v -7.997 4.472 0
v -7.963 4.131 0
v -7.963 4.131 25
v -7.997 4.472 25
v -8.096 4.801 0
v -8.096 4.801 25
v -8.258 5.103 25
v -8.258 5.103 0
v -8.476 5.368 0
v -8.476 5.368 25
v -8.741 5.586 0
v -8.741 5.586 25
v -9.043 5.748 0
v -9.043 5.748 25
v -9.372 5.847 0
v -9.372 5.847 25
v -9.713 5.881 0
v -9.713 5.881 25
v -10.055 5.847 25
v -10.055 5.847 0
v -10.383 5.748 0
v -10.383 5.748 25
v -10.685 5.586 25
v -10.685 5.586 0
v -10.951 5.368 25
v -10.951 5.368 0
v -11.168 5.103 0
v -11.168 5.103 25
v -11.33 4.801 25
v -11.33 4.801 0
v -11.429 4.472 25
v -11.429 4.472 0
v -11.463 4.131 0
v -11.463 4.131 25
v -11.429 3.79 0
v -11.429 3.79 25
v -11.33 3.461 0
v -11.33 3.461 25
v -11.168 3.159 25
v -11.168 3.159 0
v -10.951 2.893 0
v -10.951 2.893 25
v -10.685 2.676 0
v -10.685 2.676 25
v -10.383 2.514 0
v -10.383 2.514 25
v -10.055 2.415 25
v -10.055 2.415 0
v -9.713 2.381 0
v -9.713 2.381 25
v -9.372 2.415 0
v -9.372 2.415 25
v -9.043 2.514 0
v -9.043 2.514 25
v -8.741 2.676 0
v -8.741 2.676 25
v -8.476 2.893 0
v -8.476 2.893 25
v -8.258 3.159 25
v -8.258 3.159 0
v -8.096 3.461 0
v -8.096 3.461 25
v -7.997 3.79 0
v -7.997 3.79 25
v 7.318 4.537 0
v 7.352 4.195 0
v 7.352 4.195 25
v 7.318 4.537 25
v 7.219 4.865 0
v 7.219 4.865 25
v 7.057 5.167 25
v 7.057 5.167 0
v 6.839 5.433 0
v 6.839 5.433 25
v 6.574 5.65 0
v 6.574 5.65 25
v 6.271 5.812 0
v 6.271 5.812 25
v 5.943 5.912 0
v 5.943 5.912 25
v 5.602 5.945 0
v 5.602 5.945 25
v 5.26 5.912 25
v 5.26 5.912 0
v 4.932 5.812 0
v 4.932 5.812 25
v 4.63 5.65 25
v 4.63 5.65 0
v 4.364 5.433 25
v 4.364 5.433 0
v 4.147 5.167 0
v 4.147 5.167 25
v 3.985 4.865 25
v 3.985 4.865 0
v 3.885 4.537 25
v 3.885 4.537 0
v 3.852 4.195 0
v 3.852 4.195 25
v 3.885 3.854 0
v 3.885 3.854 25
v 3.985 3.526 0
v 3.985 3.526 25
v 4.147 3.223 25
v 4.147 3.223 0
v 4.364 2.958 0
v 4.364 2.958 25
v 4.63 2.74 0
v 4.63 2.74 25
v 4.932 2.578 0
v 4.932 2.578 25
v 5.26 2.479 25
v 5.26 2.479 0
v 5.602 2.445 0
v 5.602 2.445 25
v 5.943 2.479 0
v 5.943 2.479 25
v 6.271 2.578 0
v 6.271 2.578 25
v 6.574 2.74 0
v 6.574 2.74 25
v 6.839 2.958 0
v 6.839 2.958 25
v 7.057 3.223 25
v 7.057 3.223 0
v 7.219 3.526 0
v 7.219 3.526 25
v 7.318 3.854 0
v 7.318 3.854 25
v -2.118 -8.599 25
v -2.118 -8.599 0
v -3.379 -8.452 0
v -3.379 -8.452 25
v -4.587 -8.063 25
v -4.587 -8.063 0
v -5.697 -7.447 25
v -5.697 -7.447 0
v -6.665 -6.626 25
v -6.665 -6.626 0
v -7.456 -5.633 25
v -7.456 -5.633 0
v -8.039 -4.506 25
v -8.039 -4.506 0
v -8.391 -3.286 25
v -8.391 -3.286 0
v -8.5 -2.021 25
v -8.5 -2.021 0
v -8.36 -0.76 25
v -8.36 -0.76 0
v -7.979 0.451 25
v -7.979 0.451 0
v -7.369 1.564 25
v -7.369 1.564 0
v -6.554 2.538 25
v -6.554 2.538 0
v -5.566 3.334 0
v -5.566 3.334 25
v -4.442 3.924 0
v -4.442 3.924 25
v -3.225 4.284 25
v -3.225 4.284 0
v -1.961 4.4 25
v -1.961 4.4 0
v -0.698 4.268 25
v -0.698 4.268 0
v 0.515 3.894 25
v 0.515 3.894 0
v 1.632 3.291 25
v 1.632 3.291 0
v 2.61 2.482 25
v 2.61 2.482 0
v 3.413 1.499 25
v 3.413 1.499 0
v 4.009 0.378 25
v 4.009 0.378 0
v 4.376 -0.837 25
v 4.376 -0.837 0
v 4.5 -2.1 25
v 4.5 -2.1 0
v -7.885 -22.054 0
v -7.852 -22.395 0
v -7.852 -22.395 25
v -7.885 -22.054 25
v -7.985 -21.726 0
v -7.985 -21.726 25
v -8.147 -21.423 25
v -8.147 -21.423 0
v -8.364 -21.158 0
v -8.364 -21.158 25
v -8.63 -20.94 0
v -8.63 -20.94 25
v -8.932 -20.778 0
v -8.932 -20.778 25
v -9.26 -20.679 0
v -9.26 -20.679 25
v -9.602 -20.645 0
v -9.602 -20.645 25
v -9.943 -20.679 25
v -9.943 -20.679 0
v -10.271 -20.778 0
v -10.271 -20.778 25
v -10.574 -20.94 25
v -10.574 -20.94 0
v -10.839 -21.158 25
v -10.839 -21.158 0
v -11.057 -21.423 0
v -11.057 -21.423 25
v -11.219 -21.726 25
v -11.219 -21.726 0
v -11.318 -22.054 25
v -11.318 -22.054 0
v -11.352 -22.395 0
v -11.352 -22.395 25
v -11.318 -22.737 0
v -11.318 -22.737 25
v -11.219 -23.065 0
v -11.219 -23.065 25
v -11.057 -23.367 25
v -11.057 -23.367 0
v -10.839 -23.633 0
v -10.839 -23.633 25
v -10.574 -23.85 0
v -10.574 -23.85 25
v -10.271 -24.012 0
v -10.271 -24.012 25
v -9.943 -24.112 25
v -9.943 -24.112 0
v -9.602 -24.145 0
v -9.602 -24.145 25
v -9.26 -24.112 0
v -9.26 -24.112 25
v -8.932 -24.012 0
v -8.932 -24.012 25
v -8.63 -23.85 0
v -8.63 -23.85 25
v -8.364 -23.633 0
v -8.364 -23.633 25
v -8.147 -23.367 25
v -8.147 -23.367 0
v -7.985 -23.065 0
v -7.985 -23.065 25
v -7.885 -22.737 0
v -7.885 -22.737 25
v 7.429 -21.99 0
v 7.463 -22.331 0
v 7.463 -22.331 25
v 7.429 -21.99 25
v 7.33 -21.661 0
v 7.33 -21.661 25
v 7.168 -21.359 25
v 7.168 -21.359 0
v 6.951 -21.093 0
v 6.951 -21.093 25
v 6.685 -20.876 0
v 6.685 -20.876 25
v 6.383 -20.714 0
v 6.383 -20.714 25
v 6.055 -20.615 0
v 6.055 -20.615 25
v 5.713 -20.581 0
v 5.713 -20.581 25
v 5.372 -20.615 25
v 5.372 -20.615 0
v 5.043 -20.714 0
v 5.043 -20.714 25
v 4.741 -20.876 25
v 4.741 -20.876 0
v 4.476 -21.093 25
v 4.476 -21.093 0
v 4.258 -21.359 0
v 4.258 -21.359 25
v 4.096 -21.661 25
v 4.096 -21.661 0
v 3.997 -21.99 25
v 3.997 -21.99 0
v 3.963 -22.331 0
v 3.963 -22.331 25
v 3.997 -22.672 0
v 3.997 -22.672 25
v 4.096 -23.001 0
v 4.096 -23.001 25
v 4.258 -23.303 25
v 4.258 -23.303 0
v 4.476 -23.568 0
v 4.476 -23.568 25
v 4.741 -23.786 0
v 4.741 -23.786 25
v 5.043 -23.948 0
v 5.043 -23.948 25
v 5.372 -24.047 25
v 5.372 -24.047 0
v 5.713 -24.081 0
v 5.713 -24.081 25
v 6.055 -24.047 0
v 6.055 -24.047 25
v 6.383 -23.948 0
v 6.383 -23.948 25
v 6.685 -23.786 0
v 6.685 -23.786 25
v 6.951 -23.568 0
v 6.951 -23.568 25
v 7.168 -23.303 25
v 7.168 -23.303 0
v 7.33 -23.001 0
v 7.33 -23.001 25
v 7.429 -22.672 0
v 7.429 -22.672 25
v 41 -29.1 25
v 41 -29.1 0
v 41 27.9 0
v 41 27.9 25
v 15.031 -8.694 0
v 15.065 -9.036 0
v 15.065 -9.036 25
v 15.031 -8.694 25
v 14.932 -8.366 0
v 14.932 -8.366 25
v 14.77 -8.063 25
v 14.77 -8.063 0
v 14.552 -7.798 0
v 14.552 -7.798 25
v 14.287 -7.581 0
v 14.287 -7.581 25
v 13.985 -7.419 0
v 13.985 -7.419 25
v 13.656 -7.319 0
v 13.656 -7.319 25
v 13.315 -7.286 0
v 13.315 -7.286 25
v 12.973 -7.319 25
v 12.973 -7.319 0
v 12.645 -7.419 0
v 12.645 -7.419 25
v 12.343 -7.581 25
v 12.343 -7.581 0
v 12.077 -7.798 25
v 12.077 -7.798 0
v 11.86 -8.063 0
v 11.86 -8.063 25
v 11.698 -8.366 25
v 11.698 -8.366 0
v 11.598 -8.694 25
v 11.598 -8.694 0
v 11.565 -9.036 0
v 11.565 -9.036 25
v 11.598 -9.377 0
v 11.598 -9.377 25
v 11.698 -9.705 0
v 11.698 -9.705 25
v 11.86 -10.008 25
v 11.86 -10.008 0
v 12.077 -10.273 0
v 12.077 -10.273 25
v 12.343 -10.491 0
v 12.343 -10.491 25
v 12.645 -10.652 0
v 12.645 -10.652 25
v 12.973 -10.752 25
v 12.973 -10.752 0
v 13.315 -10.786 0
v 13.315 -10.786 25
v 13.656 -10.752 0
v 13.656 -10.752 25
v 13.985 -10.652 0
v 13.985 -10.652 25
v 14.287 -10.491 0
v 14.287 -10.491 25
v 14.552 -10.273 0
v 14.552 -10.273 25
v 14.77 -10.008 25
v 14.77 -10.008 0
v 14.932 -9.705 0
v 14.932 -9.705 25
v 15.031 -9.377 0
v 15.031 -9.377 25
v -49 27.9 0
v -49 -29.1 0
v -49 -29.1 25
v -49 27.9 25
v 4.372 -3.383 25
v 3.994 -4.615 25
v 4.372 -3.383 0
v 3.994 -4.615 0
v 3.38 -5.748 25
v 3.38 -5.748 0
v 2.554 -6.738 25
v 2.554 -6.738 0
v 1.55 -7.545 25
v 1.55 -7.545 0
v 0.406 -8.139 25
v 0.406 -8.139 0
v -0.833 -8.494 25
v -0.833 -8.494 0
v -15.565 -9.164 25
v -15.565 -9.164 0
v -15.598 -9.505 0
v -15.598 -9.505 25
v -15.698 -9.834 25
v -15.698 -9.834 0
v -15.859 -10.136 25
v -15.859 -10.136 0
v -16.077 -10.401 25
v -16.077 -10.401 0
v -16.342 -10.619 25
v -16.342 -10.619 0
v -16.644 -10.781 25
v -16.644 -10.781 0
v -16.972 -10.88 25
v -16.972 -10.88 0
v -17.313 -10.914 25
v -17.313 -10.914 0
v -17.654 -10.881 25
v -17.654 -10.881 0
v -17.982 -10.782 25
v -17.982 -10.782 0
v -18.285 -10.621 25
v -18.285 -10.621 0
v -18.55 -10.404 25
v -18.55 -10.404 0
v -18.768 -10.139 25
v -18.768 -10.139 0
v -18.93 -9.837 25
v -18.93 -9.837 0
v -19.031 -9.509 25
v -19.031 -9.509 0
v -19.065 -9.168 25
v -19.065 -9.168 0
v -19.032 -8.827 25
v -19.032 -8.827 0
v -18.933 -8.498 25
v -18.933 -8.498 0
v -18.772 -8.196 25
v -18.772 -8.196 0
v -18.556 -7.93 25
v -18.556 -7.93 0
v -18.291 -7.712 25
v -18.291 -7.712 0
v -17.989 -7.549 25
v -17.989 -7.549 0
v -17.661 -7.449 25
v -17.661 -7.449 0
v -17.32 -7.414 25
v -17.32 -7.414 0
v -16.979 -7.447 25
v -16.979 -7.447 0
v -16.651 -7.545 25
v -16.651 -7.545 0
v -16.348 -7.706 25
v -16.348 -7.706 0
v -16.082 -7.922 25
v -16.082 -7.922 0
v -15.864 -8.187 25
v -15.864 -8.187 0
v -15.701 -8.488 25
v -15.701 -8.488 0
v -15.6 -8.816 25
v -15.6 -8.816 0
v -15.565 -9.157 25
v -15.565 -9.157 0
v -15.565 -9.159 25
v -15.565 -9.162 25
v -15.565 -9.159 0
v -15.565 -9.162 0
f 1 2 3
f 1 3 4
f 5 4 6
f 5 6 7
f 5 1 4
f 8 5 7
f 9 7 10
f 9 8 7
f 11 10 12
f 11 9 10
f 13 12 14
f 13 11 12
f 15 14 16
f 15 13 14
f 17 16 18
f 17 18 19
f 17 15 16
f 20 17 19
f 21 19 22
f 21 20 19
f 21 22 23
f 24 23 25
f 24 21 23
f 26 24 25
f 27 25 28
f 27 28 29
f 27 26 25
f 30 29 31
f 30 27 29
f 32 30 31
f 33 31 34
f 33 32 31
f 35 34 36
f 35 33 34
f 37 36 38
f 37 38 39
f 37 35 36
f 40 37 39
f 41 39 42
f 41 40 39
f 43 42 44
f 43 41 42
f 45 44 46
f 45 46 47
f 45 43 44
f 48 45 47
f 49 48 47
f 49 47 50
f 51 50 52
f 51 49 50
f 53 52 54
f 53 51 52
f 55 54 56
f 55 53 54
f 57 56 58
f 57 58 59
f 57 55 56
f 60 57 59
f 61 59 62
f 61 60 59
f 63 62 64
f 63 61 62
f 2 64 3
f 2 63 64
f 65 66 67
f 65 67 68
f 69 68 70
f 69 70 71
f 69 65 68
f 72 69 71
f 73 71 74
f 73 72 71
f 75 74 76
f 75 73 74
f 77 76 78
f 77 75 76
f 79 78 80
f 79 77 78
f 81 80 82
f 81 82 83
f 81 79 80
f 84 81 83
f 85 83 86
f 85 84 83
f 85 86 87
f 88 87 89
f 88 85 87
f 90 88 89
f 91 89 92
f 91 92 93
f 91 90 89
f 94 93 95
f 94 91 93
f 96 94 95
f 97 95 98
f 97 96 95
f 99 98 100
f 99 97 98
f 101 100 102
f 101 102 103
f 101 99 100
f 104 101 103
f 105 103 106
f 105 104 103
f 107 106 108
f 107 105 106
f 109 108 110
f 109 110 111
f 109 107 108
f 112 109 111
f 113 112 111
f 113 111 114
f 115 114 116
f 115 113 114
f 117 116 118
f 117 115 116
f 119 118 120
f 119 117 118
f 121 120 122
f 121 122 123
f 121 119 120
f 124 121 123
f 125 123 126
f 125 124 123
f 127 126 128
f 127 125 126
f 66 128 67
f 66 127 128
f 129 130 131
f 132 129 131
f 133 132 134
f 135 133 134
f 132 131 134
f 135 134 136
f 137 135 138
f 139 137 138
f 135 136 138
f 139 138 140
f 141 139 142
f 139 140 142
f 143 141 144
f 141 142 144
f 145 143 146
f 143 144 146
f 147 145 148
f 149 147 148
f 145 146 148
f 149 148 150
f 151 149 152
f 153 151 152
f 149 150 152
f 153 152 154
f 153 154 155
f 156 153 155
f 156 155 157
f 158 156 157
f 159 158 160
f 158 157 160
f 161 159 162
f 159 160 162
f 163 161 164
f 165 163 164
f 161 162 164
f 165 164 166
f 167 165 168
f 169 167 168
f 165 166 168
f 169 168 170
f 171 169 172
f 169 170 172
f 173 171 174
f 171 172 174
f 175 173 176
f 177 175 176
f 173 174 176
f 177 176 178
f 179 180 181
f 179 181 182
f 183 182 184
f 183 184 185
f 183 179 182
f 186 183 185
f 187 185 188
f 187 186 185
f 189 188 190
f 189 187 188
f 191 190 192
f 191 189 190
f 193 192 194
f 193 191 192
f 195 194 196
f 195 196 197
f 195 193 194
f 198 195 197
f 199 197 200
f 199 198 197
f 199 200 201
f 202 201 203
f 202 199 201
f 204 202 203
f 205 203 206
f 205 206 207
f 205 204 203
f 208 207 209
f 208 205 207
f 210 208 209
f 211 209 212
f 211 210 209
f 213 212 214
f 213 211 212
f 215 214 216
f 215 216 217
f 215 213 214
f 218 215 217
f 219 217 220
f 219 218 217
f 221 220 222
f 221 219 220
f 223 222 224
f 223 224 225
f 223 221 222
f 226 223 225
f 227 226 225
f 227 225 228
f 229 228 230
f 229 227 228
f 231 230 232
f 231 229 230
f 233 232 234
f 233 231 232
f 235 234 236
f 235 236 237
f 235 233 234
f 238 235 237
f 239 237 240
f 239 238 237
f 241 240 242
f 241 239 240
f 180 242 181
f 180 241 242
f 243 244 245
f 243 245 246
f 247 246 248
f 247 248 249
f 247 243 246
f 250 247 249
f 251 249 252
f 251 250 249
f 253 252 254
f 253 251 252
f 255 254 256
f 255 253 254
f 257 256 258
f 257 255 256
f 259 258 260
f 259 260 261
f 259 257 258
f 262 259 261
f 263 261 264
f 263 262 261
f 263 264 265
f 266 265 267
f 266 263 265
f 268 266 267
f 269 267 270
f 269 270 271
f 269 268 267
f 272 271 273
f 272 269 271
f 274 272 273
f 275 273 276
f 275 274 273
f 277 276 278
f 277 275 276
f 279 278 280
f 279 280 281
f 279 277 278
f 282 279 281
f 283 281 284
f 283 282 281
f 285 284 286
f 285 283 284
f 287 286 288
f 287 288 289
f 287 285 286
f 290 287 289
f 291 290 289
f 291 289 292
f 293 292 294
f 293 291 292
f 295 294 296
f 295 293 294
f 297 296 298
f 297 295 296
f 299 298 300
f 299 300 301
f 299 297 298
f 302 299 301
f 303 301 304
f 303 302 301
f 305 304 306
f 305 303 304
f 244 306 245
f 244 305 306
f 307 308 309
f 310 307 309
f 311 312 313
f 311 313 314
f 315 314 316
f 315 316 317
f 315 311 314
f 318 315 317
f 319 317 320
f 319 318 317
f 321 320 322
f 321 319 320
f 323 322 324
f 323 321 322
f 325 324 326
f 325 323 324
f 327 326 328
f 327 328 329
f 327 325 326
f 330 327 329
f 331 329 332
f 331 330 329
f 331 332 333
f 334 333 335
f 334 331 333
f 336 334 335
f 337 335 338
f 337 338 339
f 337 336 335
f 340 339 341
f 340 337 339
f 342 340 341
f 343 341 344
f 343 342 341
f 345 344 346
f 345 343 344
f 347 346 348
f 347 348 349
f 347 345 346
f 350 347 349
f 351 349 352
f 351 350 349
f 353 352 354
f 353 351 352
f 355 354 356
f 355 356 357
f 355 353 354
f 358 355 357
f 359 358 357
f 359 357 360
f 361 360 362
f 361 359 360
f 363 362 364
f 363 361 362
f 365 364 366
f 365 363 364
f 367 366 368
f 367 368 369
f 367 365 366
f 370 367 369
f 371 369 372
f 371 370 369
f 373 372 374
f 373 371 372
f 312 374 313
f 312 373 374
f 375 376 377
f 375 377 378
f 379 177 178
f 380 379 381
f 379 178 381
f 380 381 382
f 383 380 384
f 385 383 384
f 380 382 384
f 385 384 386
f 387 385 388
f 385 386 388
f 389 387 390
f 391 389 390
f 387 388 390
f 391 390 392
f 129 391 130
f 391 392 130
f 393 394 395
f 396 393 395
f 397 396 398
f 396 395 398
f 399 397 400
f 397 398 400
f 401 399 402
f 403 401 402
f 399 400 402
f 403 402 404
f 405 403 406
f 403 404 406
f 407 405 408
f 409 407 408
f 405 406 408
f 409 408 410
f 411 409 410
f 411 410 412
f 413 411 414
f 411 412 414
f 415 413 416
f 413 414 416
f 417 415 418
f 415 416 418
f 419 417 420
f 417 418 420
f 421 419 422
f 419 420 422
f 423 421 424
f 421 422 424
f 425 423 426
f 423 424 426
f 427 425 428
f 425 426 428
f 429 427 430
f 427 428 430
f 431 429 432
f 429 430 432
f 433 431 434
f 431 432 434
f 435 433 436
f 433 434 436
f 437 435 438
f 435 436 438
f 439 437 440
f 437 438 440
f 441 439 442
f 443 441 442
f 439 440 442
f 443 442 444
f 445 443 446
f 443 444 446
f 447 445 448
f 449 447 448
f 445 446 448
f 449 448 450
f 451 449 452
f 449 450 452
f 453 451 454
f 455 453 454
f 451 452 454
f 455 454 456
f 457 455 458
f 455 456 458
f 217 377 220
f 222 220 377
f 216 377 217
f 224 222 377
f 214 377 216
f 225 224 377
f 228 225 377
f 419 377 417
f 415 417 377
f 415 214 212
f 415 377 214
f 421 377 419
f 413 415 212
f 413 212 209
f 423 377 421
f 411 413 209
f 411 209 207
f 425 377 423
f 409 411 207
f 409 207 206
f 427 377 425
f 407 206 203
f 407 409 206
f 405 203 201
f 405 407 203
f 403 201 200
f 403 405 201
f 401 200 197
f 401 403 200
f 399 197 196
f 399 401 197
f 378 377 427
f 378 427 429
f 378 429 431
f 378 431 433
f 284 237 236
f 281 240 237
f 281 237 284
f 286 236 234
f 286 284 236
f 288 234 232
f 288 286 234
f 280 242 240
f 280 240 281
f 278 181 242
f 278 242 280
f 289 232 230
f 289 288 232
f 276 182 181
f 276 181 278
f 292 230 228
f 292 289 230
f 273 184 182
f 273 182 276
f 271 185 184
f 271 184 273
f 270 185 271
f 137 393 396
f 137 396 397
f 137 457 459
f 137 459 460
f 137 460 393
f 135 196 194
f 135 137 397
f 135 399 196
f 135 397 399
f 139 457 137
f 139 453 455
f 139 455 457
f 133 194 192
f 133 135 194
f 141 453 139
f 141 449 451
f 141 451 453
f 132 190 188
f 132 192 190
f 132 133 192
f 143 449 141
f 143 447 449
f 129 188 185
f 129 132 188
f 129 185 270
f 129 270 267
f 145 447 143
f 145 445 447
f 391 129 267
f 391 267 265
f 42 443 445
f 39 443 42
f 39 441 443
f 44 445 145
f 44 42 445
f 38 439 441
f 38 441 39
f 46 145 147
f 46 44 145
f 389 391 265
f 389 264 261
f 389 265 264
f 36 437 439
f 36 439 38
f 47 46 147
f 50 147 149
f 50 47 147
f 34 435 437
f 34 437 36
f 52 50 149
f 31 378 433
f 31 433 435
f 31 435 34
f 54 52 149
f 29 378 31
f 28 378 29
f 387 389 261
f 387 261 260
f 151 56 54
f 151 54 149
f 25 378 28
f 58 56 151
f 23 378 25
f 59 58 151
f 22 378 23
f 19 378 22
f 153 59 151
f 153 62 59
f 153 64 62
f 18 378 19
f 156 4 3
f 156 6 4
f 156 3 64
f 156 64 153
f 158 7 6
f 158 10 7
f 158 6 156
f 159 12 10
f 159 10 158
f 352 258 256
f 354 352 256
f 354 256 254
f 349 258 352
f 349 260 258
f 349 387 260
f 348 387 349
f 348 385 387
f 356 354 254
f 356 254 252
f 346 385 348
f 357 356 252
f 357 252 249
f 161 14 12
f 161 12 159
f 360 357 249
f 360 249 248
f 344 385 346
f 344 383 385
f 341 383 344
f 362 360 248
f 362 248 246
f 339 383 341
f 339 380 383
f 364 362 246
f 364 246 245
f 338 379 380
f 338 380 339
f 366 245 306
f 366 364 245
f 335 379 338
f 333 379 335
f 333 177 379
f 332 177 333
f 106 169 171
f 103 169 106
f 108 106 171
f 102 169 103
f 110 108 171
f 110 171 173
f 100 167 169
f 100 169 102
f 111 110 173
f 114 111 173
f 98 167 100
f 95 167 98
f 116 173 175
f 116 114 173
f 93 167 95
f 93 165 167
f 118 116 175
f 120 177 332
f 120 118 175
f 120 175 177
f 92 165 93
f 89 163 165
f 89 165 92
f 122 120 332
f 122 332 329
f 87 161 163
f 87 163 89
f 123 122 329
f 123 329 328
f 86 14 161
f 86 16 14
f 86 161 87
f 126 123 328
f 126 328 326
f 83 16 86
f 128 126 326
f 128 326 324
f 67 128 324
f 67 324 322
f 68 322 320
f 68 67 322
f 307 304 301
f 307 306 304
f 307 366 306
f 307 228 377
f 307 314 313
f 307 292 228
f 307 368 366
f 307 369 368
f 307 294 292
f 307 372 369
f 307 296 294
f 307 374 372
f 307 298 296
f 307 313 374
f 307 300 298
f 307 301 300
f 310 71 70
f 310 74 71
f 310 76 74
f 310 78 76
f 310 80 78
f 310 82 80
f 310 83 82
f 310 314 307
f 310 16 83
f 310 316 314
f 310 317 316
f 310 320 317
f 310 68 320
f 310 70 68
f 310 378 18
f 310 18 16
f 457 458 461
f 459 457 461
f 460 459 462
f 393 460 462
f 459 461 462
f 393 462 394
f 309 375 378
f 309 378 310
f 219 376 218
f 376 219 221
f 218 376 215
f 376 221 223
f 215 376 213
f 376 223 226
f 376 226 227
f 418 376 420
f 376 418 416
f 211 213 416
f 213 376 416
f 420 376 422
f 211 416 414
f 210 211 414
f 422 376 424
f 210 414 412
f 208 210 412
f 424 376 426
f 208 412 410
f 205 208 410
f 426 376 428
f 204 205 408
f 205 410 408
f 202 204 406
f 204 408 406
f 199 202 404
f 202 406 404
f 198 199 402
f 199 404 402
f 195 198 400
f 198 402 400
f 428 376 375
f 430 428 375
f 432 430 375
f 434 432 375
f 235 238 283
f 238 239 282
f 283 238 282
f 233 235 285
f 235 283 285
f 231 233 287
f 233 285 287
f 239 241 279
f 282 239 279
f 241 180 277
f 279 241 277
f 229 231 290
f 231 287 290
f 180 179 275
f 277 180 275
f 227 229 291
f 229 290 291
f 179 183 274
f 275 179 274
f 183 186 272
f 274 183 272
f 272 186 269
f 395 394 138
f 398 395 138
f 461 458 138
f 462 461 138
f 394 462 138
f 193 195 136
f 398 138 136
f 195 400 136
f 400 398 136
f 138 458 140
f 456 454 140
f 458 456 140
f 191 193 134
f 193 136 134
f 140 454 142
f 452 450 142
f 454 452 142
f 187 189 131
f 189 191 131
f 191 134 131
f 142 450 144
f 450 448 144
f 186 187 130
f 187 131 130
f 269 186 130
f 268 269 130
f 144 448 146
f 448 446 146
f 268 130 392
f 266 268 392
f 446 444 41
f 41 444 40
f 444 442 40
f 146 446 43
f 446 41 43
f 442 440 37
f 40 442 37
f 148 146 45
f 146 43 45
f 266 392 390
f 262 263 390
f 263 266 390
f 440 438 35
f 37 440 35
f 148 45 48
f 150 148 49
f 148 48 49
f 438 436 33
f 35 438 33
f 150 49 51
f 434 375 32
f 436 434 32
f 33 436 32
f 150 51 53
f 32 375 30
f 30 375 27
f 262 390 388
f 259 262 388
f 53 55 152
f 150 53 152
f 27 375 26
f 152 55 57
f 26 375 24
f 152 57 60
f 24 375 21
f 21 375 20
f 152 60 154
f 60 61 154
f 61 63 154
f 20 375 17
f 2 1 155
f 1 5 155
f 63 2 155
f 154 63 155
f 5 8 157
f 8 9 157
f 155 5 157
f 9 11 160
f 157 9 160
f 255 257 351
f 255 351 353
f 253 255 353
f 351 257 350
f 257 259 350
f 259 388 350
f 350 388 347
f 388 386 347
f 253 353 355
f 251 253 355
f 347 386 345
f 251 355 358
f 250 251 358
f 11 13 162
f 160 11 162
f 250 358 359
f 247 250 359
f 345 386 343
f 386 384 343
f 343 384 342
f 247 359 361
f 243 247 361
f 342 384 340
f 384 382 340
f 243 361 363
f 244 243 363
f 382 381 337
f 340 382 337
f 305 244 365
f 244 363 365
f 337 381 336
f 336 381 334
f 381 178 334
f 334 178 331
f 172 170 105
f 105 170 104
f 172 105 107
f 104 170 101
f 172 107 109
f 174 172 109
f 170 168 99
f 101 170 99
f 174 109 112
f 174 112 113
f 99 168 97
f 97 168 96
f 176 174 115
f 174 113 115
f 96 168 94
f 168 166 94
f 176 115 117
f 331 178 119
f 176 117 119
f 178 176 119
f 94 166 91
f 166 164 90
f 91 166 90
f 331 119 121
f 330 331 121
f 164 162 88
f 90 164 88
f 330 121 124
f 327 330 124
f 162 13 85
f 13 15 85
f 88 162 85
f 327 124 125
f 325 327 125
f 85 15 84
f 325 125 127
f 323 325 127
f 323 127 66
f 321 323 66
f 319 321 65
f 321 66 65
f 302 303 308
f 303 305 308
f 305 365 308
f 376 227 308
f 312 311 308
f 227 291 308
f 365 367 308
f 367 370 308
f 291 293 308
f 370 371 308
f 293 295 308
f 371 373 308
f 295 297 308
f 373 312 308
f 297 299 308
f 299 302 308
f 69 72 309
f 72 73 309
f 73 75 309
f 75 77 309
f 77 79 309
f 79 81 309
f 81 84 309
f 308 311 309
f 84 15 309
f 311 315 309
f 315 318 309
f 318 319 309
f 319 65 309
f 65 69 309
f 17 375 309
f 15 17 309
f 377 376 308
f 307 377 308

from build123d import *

# Parameters (mm, degrees)
F0_W     = 90
F0_H     = 57
F0_R     = 1.75
F1_DEPTH = 25


with BuildPart() as f1:
    # F0 (on Top) → F1 (new body)
    with BuildSketch(Plane.XY):
        with Locations((-4, -0.6)):
            Rectangle(F0_W, F0_H)
        with Locations((-9.6017556655, -22.3952072493)):
            Circle(F0_R, mode=Mode.SUBTRACT)
        with BuildLine():
            ThreePointArc((-15.5648804785, -9.1569438638), (-15.5648689141, -9.1606169763), (-15.5648650592, -9.164290105))
            ThreePointArc((-15.5648650592, -9.164290105), (-19.0648612044, -9.1679632337), (-15.5648804785, -9.1569438638))
        make_face(mode=Mode.SUBTRACT)
        with Locations((5.7131093938, -22.3309171443)):
            Circle(F0_R, mode=Mode.SUBTRACT)
        with Locations((13.3148650592, -9.035709895)):
            Circle(F0_R, mode=Mode.SUBTRACT)
        with BuildLine():
            ThreePointArc((4.5, -2.1), (2.5543198547, -6.7376902291), (-2.117898665, -8.5989306739))
            ThreePointArc((-2.117898665, -8.5989306739), (-6.5543198547, 2.5376902291), (4.5, -2.1))
        make_face(mode=Mode.SUBTRACT)
        with Locations((-9.7131093938, 4.1309171443)):
            Circle(F0_R, mode=Mode.SUBTRACT)
        with Locations((5.6017556655, 4.1952072493)):
            Circle(F0_R, mode=Mode.SUBTRACT)
    extrude(amount=F1_DEPTH)


solid = f1.part
